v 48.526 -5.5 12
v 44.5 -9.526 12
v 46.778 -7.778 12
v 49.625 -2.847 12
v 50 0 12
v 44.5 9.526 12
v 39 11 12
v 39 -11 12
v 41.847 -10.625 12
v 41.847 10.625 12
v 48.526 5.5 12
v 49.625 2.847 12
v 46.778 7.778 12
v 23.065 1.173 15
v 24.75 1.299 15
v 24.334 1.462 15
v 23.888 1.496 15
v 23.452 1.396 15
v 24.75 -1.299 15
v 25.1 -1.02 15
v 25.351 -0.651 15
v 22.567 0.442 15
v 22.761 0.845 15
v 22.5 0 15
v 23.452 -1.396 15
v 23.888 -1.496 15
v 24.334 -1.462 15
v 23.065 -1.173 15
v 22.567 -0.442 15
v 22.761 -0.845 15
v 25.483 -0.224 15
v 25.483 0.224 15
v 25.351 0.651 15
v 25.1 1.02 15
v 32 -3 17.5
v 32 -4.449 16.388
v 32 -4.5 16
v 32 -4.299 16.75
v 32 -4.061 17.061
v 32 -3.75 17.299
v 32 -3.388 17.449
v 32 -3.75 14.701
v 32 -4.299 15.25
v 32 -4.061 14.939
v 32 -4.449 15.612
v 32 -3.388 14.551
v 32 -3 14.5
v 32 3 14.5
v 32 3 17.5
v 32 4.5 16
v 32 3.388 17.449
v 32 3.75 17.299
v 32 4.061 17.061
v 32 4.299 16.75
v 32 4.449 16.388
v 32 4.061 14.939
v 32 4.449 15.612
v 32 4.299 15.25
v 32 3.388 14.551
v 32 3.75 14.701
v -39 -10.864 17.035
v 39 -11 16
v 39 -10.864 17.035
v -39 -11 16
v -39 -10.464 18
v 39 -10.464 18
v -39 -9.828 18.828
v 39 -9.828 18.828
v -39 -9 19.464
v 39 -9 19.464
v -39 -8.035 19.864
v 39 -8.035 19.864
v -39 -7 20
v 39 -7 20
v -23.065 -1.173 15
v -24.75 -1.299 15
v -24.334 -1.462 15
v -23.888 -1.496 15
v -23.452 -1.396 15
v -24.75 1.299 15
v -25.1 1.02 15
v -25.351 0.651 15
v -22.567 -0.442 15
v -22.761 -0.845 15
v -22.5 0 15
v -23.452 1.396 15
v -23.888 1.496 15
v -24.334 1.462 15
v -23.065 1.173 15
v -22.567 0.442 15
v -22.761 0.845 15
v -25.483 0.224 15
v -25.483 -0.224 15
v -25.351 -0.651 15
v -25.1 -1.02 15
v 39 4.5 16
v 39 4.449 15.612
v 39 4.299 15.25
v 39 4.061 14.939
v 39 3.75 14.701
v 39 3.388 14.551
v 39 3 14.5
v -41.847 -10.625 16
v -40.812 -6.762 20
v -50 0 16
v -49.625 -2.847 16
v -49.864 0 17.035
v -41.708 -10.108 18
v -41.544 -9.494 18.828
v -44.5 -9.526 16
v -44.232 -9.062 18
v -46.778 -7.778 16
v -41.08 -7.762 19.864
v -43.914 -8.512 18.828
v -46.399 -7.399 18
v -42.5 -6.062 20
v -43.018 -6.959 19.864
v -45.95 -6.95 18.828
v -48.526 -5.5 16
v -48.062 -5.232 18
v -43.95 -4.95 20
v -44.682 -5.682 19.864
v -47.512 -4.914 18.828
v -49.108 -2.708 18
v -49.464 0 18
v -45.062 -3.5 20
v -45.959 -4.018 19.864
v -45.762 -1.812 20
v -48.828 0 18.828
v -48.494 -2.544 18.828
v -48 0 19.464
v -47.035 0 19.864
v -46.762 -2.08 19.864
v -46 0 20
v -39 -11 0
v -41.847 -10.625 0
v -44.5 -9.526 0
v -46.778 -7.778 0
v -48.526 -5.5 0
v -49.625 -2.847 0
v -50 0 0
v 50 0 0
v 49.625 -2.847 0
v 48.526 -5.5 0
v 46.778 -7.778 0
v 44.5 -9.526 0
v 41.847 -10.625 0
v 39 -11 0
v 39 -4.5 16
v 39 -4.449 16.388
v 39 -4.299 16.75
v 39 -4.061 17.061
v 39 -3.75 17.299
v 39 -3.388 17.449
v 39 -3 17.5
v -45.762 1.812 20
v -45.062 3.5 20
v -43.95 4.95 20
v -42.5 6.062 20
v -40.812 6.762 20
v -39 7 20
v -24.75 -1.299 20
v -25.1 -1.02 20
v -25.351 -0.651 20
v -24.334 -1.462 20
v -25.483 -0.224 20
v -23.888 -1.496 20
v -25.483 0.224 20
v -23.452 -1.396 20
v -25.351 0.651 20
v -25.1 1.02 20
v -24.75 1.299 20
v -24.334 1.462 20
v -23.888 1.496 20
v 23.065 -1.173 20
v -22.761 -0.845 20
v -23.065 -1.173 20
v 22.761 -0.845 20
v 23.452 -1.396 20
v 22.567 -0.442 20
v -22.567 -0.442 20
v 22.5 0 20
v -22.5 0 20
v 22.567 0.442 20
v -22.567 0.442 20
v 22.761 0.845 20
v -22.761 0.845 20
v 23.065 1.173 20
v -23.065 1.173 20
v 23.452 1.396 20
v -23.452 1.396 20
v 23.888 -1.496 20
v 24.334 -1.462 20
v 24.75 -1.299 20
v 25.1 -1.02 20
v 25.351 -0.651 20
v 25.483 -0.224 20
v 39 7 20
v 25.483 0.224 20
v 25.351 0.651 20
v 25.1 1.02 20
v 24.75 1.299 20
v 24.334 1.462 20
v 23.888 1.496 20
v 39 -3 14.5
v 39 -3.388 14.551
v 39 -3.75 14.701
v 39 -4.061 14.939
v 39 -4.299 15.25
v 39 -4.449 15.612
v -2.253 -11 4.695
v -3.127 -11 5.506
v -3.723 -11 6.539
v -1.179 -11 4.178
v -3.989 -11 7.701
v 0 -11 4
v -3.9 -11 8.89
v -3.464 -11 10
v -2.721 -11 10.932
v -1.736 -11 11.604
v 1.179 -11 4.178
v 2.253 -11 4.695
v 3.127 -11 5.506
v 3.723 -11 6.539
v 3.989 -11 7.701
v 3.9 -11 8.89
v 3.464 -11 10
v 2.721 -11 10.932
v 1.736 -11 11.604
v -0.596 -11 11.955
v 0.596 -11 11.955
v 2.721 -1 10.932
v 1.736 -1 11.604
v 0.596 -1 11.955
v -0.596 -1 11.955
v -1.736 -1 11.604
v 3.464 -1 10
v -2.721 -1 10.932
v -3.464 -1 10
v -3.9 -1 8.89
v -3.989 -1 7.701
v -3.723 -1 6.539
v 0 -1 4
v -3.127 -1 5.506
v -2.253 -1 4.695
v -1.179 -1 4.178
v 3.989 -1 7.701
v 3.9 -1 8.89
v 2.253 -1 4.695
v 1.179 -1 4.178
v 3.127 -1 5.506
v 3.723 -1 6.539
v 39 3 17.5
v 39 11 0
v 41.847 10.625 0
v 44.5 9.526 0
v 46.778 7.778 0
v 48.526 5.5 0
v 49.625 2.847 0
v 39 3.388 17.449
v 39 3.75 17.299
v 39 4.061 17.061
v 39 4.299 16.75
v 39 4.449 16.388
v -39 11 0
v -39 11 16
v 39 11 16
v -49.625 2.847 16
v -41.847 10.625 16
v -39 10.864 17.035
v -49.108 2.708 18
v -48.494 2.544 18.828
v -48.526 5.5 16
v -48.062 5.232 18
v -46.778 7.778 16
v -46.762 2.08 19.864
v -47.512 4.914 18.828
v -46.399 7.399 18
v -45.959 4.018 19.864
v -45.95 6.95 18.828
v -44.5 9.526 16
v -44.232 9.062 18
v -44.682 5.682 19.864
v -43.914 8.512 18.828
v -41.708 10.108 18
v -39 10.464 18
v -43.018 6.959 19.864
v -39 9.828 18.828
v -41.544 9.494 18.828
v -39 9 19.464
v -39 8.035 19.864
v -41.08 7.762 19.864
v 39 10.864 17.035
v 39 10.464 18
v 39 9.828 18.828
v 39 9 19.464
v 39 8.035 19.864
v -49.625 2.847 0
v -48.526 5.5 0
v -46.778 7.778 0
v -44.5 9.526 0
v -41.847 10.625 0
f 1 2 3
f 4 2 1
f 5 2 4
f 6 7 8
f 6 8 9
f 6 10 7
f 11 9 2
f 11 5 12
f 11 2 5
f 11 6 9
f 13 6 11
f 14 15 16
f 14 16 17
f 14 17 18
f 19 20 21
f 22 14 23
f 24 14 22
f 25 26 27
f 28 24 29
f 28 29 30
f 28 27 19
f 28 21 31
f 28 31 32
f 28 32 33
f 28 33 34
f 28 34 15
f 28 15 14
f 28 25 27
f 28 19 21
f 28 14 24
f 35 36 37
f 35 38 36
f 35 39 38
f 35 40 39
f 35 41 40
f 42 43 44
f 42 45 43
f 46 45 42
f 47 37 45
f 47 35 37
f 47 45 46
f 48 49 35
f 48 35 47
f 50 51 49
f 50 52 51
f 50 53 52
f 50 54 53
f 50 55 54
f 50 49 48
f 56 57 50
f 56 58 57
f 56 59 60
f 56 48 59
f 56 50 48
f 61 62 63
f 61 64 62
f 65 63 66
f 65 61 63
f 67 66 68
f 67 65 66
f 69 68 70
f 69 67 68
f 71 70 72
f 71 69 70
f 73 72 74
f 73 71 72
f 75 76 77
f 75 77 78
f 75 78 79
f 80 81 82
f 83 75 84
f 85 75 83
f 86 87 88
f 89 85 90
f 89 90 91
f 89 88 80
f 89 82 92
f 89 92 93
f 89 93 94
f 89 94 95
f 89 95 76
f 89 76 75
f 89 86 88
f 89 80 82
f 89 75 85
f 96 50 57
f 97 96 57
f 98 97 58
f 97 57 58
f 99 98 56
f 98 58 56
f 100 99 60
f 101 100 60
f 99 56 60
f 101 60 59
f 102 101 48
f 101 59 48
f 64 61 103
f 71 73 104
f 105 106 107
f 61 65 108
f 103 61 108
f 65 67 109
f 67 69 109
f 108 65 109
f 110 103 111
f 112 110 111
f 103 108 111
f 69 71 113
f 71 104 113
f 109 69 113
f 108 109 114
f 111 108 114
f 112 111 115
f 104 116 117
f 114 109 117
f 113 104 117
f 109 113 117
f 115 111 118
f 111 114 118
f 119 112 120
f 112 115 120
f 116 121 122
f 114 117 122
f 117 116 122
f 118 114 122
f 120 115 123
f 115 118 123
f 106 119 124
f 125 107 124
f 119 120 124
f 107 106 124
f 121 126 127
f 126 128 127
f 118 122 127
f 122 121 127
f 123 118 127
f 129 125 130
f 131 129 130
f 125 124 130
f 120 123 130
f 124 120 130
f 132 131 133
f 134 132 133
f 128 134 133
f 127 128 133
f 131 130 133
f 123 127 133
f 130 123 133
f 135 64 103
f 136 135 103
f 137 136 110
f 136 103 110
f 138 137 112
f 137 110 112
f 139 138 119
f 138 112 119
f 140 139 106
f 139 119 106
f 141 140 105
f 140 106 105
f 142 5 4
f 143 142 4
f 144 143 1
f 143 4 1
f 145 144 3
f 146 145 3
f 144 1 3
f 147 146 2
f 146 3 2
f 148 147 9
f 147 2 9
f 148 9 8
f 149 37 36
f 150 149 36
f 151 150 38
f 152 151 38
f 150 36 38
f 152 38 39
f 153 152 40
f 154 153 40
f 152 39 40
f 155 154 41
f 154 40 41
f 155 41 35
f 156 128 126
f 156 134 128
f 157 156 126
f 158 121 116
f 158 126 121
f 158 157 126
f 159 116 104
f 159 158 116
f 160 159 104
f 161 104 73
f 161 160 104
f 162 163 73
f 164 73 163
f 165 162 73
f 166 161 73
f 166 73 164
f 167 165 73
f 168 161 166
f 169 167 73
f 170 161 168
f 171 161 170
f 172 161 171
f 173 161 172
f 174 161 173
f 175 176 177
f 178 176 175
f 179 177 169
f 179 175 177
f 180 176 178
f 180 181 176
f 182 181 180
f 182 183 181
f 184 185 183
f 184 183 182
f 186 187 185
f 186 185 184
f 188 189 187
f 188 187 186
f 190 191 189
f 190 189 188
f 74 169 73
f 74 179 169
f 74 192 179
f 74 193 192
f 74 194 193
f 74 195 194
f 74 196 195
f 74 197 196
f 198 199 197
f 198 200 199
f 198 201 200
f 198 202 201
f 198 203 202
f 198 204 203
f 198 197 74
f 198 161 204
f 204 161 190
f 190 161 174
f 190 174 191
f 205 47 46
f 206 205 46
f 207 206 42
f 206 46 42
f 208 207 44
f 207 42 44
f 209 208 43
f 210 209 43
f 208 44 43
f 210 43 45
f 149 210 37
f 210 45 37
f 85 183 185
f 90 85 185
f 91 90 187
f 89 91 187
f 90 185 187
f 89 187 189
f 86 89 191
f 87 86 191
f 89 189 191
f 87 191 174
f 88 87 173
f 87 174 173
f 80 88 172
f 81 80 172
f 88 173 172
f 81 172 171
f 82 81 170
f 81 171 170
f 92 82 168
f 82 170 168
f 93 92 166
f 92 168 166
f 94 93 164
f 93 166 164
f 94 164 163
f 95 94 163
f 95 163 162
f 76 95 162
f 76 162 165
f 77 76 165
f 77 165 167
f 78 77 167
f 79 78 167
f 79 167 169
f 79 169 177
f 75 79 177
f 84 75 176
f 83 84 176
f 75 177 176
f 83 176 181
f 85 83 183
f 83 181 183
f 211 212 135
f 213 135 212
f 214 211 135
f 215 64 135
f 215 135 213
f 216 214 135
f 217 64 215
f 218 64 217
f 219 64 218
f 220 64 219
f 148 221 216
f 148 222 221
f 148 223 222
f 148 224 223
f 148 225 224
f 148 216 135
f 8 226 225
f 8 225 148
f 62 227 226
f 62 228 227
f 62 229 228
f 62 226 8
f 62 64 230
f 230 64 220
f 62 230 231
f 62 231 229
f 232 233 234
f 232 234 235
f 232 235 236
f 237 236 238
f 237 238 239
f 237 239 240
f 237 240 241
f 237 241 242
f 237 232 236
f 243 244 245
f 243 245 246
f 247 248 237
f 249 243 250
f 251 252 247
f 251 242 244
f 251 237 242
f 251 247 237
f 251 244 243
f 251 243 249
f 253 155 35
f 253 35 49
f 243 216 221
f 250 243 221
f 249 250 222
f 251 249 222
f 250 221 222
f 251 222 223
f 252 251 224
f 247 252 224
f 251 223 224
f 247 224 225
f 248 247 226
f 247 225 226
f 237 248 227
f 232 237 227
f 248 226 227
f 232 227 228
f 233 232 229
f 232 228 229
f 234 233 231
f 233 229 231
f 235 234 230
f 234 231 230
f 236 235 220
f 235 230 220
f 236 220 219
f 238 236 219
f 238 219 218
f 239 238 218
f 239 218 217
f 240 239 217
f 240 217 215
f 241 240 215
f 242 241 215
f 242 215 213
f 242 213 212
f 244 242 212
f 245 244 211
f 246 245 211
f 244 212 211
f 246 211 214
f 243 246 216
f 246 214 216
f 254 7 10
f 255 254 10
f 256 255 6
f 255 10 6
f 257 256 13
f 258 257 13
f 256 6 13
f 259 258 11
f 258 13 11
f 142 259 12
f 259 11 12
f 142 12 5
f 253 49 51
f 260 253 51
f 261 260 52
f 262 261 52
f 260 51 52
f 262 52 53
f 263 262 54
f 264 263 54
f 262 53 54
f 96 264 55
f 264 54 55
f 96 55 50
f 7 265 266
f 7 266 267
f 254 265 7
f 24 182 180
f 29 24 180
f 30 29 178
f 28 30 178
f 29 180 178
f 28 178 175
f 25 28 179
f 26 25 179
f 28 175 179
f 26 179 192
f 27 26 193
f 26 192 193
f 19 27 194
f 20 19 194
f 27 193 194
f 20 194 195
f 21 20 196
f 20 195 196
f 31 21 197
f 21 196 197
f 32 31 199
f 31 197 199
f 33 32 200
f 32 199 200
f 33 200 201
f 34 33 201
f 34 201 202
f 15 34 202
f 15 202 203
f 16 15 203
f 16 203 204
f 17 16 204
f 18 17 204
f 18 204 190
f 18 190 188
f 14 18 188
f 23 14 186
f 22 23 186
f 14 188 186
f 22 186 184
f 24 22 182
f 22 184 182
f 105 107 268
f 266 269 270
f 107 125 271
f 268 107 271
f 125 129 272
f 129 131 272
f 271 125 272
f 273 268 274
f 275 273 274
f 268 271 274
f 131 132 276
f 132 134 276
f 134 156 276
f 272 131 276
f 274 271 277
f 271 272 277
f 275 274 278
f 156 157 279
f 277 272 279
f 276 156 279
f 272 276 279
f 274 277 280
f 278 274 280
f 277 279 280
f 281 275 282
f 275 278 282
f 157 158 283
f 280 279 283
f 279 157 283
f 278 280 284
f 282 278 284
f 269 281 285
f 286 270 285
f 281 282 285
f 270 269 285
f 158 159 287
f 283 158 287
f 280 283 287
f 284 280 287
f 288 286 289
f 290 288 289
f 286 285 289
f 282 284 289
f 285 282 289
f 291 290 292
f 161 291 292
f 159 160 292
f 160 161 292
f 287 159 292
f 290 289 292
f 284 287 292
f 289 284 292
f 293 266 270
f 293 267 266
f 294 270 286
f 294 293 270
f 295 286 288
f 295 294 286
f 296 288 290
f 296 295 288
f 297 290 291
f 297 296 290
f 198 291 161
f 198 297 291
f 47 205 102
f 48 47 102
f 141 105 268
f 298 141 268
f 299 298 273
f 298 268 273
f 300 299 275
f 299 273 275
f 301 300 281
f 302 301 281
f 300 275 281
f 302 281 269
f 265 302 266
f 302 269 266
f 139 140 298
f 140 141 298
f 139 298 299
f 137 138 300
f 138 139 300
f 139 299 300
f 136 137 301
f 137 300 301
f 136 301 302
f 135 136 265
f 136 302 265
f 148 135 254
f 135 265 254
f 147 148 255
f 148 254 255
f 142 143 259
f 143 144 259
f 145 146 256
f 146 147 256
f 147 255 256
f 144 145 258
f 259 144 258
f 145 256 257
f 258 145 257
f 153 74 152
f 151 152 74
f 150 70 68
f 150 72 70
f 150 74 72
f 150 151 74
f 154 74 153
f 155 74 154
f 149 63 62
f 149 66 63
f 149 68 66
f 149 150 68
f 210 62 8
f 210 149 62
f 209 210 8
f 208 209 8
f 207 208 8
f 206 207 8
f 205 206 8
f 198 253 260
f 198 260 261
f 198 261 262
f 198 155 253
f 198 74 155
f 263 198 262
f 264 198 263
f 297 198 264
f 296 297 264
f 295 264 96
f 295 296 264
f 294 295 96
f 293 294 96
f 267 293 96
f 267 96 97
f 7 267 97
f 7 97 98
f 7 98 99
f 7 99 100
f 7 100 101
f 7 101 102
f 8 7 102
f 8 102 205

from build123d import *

# Parameters (mm, degrees)
SKETCH_1_W          = 100.00000000000001
SKETCH_1_H          = 22
EXTRUDE_3_DEPTH     = 20
CUT_EXTRUDE_2_DEPTH = 20
CUT_EXTRUDE_3_DEPTH = 8
SKETCH_5_W          = 3.0000000000000018
SKETCH_5_H          = 9
CUT_EXTRUDE_5_DEPTH = 7
EXTRUDE_4_DEPTH     = 7
SKETCH_8_R          = 6
CUT_EXTRUDE_7_DEPTH = 10
FILLET_1_R          = 4
SKETCH_9_R          = 1.5000000000000007
CUT_EXTRUDE_8_DEPTH = 5
SKETCH_10_R         = 6.000000000004547
EXTRUDE_5_DEPTH     = 10
SKETCH_11_R         = 4
CUT_EXTRUDE_9_DEPTH = 10


with BuildPart() as part:
    # 草图1 → 凸台-拉伸3 (new body)
    with BuildSketch(Plane.XY):
        Rectangle(SKETCH_1_W, SKETCH_1_H)
    extrude(amount=EXTRUDE_3_DEPTH)

    # 草图3 → 切除-拉伸2 (cut)
    with BuildSketch(Plane.XY.offset(20)):
        with BuildLine():
            ThreePointArc((-50.00000000000001, 9.1e-16), (-46.77817459305203, 7.778174593052023), (-39.00000000000001, 11))
            Line((-39, 11), (-50, 11))
            Line((-50, 11), (-50, 1.78e-15))
        make_face()
        with BuildLine():
            Line((50, 11), (39.00000000000001, 11))
            ThreePointArc((39.00000000000001, 11), (46.77817459305203, 7.778174593052022), (50.00000000000001, -4.3e-16))
            Line((50, 0), (50, 11))
        make_face()
        with BuildLine():
            ThreePointArc((-39.00000000000001, -11), (-46.77817459305203, -7.778174593052022), (-50.00000000000001, 9.1e-16))
            Line((-50, 1.78e-15), (-50, -11))
            Line((-50, -11), (-39.00000000000001, -11))
        make_face()
        with BuildLine():
            Line((50, -11), (50, 0))
            ThreePointArc((50.00000000000001, -3.13e-15), (46.77817459305203, -7.778174593052024), (39.00000000000001, -11))
            Line((39, -11), (50, -11))
        make_face()
    extrude(amount=-CUT_EXTRUDE_2_DEPTH, mode=Mode.SUBTRACT)

    # 草图4 → 切除-拉伸3 (cut)
    with BuildSketch(Plane.XY.offset(20)):
        with BuildLine():
            ThreePointArc((50.000000000000014, 0), (46.77817459305202, 7.778174593052019), (38.999999999999986, 10.999999999999963))
            Line((38.999999999999964, 11), (39.00000000000013, -11))
            ThreePointArc((39.000000000000064, -10.999999999999963), (46.77817459305205, -7.7781745930519905), (50.000000000000014, -2.69e-15))
        make_face()
    extrude(amount=-CUT_EXTRUDE_3_DEPTH, mode=Mode.SUBTRACT)

    # 草图5 → 切除-拉伸5 (cut)
    with BuildSketch(Plane(origin=(39.00000000000005, 2.8292e-13, 0), x_dir=(0, 0, -1), z_dir=(1, 7.25e-15, 0))):
        with Locations((-16, 0)):
            Rectangle(SKETCH_5_W, SKETCH_5_H)
    extrude(amount=-CUT_EXTRUDE_5_DEPTH, mode=Mode.SUBTRACT)

    # 草图7 → 凸台-拉伸4 (add)
    with BuildSketch(Plane(origin=(32.00000000000005, 2.4672e-13, 0), x_dir=(0, 0, -1), z_dir=(1, 7.71e-15, 0))):
        with BuildLine():
            ThreePointArc((-17.5, 2.9999999999999836), (-17.060660171779823, 4.060660171779805), (-16, 4.499999999999984))
            Line((-16, 4.499999999999984), (-17.5, 4.499999999999985))
            Line((-17.5, 4.499999999999985), (-17.5, 2.9999999999999836))
        make_face()
        with BuildLine():
            Line((-14.499999999999998, 4.499999999999985), (-16, 4.499999999999984))
            ThreePointArc((-16, 4.499999999999984), (-14.939339828220177, 4.060660171779805), (-14.5, 2.9999999999999836))
            Line((-14.499999999999998, 2.9999999999999836), (-14.499999999999998, 4.499999999999985))
        make_face()
        with BuildLine():
            Line((-14.499999999999998, -4.500000000000014), (-14.499999999999998, -3.00000000000002))
            ThreePointArc((-14.5, -3.0000000000000204), (-14.939339828220177, -4.0606601717798405), (-15.999999999999998, -4.50000000000002))
            Line((-15.999999999999998, -4.500000000000016), (-14.499999999999998, -4.500000000000014))
        make_face()
        with BuildLine():
            ThreePointArc((-15.999999999999998, -4.50000000000002), (-17.060660171779823, -4.060660171779842), (-17.5, -3.00000000000002))
            Line((-17.5, -3.00000000000002), (-17.5, -4.500000000000018))
            Line((-17.5, -4.500000000000018), (-15.999999999999998, -4.500000000000016))
        make_face()
    extrude(amount=EXTRUDE_4_DEPTH)

    # 草图8 → 切除-拉伸7 (cut)
    with BuildSketch(Plane.XZ.offset(11)):
        with Locations((0, 9.999999999995454)):
            Circle(SKETCH_8_R)
    extrude(amount=-CUT_EXTRUDE_7_DEPTH, mode=Mode.SUBTRACT)

    # 圆角1
    fillet_1_edges = [part.edges().sort_by_distance(p)[0] for p in [
        (-50.00000000000001, -6.6e-16, 20),
        (0, -11, 20),
        (0, 11, 20),
    ]]
    fillet(fillet_1_edges, radius=FILLET_1_R)

    # 草图9 → 切除-拉伸8 (cut)
    with BuildSketch(Plane.XY.offset(20)):
        with Locations((-24.000000000000007, 0)):
            Circle(SKETCH_9_R)
        with Locations((24.000000000000007, 0)):
            Circle(SKETCH_9_R)
    extrude(amount=-CUT_EXTRUDE_8_DEPTH, mode=Mode.SUBTRACT)

    # 草图10 → 凸台-拉伸5 (add)
    with BuildSketch(Plane.XZ.offset(11)):
        with Locations((0, 9.999999999995454)):
            Circle(SKETCH_10_R)
    extrude(amount=-EXTRUDE_5_DEPTH)

    # 草图11 → 切除-拉伸9 (cut)
    with BuildSketch(Plane.XZ.offset(11)):
        with Locations((0, 8.000000000004889)):
            Circle(SKETCH_11_R)
    extrude(amount=-CUT_EXTRUDE_9_DEPTH, mode=Mode.SUBTRACT)


solid = part.part
